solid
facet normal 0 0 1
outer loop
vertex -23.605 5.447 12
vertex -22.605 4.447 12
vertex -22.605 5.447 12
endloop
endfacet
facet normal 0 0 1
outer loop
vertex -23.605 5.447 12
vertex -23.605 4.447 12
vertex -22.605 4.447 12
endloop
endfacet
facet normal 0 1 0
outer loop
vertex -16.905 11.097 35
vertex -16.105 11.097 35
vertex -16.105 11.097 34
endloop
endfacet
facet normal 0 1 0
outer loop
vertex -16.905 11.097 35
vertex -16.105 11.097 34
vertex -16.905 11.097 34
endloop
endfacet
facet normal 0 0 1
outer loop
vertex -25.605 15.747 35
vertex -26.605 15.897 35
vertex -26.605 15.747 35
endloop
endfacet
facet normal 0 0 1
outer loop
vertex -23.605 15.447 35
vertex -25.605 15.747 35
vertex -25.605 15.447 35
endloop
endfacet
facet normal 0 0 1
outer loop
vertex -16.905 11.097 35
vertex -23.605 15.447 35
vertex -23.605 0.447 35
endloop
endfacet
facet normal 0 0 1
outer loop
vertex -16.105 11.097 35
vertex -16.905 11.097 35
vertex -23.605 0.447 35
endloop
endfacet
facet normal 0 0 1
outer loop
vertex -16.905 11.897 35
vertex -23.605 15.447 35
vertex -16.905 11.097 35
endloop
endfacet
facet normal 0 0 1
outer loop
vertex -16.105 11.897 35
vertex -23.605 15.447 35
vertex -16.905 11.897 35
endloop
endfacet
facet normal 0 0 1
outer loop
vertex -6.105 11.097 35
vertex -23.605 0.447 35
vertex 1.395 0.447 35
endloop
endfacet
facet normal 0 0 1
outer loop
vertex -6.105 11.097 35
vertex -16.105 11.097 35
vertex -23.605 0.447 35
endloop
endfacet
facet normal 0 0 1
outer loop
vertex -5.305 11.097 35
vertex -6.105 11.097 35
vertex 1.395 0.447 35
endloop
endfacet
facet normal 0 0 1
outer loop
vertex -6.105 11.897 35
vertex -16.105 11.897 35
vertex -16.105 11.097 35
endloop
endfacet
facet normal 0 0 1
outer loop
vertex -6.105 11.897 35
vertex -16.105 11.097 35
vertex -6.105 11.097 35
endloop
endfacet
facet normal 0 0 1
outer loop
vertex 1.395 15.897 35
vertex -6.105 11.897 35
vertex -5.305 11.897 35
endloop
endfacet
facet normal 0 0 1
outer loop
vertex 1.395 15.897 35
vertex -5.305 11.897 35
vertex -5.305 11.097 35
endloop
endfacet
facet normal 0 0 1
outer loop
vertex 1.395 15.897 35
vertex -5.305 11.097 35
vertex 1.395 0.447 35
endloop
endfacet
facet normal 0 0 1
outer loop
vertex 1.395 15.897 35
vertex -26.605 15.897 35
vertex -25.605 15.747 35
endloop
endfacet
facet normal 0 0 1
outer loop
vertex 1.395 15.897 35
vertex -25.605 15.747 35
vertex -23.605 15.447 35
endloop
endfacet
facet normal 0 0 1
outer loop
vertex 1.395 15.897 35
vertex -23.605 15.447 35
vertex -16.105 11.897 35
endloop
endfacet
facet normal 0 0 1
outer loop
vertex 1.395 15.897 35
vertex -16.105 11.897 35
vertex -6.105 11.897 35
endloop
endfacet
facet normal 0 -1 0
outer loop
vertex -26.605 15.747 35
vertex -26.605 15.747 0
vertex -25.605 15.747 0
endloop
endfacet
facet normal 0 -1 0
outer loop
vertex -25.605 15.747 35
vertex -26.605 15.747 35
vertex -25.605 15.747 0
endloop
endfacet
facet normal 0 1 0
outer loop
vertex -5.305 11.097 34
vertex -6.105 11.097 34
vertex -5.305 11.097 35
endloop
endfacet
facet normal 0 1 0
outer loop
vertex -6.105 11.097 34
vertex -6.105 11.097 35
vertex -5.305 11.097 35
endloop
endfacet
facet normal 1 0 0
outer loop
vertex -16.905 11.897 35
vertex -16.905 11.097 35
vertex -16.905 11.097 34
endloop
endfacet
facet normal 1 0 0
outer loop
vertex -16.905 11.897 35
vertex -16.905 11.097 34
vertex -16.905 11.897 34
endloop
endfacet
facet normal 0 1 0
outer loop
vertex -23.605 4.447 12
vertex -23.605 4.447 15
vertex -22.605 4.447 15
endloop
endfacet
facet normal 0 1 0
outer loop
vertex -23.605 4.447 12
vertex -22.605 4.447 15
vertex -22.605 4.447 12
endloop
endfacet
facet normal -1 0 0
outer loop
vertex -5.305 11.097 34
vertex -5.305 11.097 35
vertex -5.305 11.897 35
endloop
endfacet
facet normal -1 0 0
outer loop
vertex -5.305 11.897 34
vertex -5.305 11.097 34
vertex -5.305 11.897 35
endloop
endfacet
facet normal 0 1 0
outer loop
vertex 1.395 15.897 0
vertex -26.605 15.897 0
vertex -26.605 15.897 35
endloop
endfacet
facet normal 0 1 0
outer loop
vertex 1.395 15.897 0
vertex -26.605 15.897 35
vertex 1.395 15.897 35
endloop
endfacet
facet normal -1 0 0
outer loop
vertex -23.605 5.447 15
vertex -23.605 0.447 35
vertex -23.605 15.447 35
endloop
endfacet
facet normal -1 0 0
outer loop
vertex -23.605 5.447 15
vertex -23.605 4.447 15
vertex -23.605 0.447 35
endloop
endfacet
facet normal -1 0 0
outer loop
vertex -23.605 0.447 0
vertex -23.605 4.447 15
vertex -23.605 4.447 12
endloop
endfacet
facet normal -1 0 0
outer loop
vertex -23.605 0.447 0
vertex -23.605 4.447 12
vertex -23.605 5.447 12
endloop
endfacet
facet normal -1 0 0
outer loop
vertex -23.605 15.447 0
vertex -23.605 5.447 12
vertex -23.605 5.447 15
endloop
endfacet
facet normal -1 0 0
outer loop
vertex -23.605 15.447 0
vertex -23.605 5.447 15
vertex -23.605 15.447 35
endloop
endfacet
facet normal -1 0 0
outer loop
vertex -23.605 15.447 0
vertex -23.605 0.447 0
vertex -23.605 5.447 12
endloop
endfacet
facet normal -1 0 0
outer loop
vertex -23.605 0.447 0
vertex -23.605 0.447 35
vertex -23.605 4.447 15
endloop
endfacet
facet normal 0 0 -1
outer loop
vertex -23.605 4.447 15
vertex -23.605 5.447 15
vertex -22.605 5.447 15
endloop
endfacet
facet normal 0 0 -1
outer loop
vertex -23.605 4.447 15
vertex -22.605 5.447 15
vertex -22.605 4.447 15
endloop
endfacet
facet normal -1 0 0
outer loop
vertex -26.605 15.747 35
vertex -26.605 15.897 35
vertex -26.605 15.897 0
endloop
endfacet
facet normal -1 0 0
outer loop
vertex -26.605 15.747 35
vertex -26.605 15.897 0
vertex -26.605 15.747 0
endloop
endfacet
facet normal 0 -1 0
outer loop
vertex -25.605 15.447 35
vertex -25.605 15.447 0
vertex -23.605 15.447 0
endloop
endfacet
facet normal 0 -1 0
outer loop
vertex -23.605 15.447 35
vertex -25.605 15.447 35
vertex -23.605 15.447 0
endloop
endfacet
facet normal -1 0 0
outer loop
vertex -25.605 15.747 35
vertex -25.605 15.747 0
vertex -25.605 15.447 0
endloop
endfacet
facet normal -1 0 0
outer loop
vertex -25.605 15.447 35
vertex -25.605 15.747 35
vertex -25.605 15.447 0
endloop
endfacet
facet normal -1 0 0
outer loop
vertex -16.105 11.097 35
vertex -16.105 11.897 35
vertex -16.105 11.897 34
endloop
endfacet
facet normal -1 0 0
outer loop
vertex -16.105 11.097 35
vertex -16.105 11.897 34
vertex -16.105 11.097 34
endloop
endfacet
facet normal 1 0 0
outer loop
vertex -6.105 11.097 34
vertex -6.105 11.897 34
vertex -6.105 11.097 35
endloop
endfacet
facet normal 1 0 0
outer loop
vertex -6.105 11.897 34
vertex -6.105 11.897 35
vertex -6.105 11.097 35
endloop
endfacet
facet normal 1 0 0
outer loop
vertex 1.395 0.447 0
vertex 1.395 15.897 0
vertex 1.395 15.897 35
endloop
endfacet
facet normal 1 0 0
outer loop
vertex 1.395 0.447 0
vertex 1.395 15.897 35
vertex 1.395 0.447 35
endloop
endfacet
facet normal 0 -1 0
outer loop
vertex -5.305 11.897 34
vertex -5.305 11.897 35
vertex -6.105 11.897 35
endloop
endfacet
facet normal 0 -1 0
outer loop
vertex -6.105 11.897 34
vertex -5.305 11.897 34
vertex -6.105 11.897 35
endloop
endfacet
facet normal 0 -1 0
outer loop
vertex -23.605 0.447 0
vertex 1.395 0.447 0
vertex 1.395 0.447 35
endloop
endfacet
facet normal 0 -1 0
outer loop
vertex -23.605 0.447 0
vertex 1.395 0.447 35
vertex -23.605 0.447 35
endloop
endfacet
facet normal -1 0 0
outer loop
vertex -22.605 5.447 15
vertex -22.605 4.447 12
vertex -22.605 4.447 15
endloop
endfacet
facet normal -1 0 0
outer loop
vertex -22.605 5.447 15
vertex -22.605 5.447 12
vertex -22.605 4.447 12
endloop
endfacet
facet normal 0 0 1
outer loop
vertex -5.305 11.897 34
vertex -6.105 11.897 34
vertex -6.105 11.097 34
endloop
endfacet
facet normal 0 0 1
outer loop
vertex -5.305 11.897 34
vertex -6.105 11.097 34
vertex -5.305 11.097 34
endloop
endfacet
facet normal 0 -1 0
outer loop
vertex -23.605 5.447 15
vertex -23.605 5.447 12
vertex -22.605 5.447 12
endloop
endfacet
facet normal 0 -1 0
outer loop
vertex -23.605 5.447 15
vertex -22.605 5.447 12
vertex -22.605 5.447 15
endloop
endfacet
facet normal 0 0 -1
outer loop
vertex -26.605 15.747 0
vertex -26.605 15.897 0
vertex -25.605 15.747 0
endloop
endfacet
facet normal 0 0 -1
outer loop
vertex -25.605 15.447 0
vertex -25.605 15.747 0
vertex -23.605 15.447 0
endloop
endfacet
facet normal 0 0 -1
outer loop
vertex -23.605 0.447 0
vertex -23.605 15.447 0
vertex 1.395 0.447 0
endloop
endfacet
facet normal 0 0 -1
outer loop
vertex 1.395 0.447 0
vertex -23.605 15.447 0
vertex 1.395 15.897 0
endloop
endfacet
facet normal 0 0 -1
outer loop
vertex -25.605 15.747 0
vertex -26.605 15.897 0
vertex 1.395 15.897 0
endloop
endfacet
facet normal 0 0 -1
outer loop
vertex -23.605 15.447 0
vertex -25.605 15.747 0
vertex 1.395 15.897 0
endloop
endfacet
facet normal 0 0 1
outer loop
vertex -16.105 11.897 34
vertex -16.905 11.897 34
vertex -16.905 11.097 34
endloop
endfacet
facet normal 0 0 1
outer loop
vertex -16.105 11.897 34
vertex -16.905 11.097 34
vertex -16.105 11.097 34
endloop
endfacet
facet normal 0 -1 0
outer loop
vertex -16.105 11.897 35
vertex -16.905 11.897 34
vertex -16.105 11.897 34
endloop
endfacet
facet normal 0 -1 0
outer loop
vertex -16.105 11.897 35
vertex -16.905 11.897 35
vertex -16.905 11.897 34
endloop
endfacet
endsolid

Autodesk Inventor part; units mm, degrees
ref_plane "YZ Plane" through (0, 0, 0) normal (1, 0, 0) x (0, 1, 0)
ref_plane "XZ Plane" through (0, 0, 0) normal (0, 1, 0) x (-1, 0, 0)
ref_plane "XY Plane" through (0, 0, 0) normal (0, 0, 1) x (1, 0, 0)
sketch "Sketch1" plane through (0, 0, 0) normal (0, 0, 1) x (1, 0, 0)
  line L0 (-23.6052, 15.8968) -> (1.3948, 15.8968)
  line L1 (1.3948, 15.8968) -> (1.3948, 0.4466)
  line L2 (1.3948, 0.4466) -> (-23.6052, 0.4466)
  line L3 (-23.6052, 0.4466) -> (-23.6052, 15.4466)
  line L4 (-23.6052, 15.8968) -> (-26.1052, 15.8968)
  line L5 (-25.6052, 15.7466) -> (-25.6052, 15.4466)
  line L6 (-25.6052, 15.4466) -> (-23.6052, 15.4466)
  line L7 (-26.1052, 15.8968) -> (-26.6052, 15.8968)
  line L8 (-26.6052, 15.8968) -> (-26.6052, 15.7466)
  line L9 (-26.6052, 15.7466) -> (-25.6052, 15.7466)
  point P0 (0, 0)
  dimension "d0" = 15
  dimension "d1" = 25
  dimension "d2" = 2
  dimension "d3" = 1
  dimension "d4" = 2.5
  dimension "d5" = 0.5
  dimension "d6" = 0.1502
  dimension "d7" = 0.3
extrude "Extrusion1" add sketch "Sketch1" along normal blind 35
sketch "Sketch4" plane through (0, 0, 35) normal (0, 0, 1) x (1, 0, 0)
  line L0 (-26.6052, 15.8968) -> (-26.6052, 15.7466) projected
  line L1 (-26.6052, 15.7466) -> (-25.6052, 15.7466) projected
  line L2 (-25.6052, 15.7466) -> (-25.6052, 15.4466) projected
  line L3 (-25.6052, 15.4466) -> (-23.6052, 15.4466) projected
  line L4 (-23.6052, 15.4466) -> (-23.6052, 0.4466) projected
  line L5 (-23.6052, 0.4466) -> (1.3948, 0.4466) projected
  line L6 (1.3948, 0.4466) -> (1.3948, 15.8968) projected
  line L7 (1.3948, 15.8968) -> (-26.6052, 15.8968) projected
  line L8 (-16.9052, 11.8968) -> (-16.1052, 11.8968)
  line L9 (-16.1052, 11.8968) -> (-16.1052, 11.0968)
  line L10 (-16.1052, 11.0968) -> (-16.9052, 11.0968)
  line L11 (-16.9052, 11.0968) -> (-16.9052, 11.8968)
  line L12 (-23.6052, 0.4466) -> (1.3948, 0.4466) projected
  line L13 (-11.1052, 0.4466) -> (-11.1052, 15.8968)
  line L14 (1.3948, 15.8968) -> (-26.6052, 15.8968) projected
  line L15 (-5.3052, 11.8968) -> (-6.1052, 11.8968)
  line L16 (-6.1052, 11.8968) -> (-6.1052, 11.0968)
  line L17 (-6.1052, 11.0968) -> (-5.3052, 11.0968)
  line L18 (-5.3052, 11.0968) -> (-5.3052, 11.8968)
  point P0 (0, 0)
  dimension "d26" = 10
  dimension "d27" = 0.8
  dimension "d28" = 0.8
  dimension "d29" = 4
extrude "Extrusion2" cut sketch "Sketch4" against normal blind 1 contours L8 L9 L10 L11 | L18 L17 L16 L15
sketch "Sketch5" plane through (-23.6052, 0.4466, 0) normal (-1, 0, 0) x (0, 0, 1)
  line L0 (0, 15) -> (0, 0) projected
  line L1 (0, 0) -> (35, 0) projected
  line L2 (35, 15) -> (35, 0) projected
  line L3 (0, 15) -> (35, 15) projected
  line L4 (12, 5) -> (15, 5)
  line L5 (15, 5) -> (15, 4)
  line L6 (15, 4) -> (12, 4)
  line L7 (12, 4) -> (12, 5)
  point P0 (0, -0.4466)
  dimension "d32" = 1
  dimension "d33" = 3
  dimension "d34" = 10
  dimension "d35" = 20
extrude "Extrusion3" cut sketch "Sketch5" against normal blind 1 contours L4 L5 L6 L7
equation "\"d28\" = d27"
properties part number "McCrea_zadne_oko_walle" material "Silver"
